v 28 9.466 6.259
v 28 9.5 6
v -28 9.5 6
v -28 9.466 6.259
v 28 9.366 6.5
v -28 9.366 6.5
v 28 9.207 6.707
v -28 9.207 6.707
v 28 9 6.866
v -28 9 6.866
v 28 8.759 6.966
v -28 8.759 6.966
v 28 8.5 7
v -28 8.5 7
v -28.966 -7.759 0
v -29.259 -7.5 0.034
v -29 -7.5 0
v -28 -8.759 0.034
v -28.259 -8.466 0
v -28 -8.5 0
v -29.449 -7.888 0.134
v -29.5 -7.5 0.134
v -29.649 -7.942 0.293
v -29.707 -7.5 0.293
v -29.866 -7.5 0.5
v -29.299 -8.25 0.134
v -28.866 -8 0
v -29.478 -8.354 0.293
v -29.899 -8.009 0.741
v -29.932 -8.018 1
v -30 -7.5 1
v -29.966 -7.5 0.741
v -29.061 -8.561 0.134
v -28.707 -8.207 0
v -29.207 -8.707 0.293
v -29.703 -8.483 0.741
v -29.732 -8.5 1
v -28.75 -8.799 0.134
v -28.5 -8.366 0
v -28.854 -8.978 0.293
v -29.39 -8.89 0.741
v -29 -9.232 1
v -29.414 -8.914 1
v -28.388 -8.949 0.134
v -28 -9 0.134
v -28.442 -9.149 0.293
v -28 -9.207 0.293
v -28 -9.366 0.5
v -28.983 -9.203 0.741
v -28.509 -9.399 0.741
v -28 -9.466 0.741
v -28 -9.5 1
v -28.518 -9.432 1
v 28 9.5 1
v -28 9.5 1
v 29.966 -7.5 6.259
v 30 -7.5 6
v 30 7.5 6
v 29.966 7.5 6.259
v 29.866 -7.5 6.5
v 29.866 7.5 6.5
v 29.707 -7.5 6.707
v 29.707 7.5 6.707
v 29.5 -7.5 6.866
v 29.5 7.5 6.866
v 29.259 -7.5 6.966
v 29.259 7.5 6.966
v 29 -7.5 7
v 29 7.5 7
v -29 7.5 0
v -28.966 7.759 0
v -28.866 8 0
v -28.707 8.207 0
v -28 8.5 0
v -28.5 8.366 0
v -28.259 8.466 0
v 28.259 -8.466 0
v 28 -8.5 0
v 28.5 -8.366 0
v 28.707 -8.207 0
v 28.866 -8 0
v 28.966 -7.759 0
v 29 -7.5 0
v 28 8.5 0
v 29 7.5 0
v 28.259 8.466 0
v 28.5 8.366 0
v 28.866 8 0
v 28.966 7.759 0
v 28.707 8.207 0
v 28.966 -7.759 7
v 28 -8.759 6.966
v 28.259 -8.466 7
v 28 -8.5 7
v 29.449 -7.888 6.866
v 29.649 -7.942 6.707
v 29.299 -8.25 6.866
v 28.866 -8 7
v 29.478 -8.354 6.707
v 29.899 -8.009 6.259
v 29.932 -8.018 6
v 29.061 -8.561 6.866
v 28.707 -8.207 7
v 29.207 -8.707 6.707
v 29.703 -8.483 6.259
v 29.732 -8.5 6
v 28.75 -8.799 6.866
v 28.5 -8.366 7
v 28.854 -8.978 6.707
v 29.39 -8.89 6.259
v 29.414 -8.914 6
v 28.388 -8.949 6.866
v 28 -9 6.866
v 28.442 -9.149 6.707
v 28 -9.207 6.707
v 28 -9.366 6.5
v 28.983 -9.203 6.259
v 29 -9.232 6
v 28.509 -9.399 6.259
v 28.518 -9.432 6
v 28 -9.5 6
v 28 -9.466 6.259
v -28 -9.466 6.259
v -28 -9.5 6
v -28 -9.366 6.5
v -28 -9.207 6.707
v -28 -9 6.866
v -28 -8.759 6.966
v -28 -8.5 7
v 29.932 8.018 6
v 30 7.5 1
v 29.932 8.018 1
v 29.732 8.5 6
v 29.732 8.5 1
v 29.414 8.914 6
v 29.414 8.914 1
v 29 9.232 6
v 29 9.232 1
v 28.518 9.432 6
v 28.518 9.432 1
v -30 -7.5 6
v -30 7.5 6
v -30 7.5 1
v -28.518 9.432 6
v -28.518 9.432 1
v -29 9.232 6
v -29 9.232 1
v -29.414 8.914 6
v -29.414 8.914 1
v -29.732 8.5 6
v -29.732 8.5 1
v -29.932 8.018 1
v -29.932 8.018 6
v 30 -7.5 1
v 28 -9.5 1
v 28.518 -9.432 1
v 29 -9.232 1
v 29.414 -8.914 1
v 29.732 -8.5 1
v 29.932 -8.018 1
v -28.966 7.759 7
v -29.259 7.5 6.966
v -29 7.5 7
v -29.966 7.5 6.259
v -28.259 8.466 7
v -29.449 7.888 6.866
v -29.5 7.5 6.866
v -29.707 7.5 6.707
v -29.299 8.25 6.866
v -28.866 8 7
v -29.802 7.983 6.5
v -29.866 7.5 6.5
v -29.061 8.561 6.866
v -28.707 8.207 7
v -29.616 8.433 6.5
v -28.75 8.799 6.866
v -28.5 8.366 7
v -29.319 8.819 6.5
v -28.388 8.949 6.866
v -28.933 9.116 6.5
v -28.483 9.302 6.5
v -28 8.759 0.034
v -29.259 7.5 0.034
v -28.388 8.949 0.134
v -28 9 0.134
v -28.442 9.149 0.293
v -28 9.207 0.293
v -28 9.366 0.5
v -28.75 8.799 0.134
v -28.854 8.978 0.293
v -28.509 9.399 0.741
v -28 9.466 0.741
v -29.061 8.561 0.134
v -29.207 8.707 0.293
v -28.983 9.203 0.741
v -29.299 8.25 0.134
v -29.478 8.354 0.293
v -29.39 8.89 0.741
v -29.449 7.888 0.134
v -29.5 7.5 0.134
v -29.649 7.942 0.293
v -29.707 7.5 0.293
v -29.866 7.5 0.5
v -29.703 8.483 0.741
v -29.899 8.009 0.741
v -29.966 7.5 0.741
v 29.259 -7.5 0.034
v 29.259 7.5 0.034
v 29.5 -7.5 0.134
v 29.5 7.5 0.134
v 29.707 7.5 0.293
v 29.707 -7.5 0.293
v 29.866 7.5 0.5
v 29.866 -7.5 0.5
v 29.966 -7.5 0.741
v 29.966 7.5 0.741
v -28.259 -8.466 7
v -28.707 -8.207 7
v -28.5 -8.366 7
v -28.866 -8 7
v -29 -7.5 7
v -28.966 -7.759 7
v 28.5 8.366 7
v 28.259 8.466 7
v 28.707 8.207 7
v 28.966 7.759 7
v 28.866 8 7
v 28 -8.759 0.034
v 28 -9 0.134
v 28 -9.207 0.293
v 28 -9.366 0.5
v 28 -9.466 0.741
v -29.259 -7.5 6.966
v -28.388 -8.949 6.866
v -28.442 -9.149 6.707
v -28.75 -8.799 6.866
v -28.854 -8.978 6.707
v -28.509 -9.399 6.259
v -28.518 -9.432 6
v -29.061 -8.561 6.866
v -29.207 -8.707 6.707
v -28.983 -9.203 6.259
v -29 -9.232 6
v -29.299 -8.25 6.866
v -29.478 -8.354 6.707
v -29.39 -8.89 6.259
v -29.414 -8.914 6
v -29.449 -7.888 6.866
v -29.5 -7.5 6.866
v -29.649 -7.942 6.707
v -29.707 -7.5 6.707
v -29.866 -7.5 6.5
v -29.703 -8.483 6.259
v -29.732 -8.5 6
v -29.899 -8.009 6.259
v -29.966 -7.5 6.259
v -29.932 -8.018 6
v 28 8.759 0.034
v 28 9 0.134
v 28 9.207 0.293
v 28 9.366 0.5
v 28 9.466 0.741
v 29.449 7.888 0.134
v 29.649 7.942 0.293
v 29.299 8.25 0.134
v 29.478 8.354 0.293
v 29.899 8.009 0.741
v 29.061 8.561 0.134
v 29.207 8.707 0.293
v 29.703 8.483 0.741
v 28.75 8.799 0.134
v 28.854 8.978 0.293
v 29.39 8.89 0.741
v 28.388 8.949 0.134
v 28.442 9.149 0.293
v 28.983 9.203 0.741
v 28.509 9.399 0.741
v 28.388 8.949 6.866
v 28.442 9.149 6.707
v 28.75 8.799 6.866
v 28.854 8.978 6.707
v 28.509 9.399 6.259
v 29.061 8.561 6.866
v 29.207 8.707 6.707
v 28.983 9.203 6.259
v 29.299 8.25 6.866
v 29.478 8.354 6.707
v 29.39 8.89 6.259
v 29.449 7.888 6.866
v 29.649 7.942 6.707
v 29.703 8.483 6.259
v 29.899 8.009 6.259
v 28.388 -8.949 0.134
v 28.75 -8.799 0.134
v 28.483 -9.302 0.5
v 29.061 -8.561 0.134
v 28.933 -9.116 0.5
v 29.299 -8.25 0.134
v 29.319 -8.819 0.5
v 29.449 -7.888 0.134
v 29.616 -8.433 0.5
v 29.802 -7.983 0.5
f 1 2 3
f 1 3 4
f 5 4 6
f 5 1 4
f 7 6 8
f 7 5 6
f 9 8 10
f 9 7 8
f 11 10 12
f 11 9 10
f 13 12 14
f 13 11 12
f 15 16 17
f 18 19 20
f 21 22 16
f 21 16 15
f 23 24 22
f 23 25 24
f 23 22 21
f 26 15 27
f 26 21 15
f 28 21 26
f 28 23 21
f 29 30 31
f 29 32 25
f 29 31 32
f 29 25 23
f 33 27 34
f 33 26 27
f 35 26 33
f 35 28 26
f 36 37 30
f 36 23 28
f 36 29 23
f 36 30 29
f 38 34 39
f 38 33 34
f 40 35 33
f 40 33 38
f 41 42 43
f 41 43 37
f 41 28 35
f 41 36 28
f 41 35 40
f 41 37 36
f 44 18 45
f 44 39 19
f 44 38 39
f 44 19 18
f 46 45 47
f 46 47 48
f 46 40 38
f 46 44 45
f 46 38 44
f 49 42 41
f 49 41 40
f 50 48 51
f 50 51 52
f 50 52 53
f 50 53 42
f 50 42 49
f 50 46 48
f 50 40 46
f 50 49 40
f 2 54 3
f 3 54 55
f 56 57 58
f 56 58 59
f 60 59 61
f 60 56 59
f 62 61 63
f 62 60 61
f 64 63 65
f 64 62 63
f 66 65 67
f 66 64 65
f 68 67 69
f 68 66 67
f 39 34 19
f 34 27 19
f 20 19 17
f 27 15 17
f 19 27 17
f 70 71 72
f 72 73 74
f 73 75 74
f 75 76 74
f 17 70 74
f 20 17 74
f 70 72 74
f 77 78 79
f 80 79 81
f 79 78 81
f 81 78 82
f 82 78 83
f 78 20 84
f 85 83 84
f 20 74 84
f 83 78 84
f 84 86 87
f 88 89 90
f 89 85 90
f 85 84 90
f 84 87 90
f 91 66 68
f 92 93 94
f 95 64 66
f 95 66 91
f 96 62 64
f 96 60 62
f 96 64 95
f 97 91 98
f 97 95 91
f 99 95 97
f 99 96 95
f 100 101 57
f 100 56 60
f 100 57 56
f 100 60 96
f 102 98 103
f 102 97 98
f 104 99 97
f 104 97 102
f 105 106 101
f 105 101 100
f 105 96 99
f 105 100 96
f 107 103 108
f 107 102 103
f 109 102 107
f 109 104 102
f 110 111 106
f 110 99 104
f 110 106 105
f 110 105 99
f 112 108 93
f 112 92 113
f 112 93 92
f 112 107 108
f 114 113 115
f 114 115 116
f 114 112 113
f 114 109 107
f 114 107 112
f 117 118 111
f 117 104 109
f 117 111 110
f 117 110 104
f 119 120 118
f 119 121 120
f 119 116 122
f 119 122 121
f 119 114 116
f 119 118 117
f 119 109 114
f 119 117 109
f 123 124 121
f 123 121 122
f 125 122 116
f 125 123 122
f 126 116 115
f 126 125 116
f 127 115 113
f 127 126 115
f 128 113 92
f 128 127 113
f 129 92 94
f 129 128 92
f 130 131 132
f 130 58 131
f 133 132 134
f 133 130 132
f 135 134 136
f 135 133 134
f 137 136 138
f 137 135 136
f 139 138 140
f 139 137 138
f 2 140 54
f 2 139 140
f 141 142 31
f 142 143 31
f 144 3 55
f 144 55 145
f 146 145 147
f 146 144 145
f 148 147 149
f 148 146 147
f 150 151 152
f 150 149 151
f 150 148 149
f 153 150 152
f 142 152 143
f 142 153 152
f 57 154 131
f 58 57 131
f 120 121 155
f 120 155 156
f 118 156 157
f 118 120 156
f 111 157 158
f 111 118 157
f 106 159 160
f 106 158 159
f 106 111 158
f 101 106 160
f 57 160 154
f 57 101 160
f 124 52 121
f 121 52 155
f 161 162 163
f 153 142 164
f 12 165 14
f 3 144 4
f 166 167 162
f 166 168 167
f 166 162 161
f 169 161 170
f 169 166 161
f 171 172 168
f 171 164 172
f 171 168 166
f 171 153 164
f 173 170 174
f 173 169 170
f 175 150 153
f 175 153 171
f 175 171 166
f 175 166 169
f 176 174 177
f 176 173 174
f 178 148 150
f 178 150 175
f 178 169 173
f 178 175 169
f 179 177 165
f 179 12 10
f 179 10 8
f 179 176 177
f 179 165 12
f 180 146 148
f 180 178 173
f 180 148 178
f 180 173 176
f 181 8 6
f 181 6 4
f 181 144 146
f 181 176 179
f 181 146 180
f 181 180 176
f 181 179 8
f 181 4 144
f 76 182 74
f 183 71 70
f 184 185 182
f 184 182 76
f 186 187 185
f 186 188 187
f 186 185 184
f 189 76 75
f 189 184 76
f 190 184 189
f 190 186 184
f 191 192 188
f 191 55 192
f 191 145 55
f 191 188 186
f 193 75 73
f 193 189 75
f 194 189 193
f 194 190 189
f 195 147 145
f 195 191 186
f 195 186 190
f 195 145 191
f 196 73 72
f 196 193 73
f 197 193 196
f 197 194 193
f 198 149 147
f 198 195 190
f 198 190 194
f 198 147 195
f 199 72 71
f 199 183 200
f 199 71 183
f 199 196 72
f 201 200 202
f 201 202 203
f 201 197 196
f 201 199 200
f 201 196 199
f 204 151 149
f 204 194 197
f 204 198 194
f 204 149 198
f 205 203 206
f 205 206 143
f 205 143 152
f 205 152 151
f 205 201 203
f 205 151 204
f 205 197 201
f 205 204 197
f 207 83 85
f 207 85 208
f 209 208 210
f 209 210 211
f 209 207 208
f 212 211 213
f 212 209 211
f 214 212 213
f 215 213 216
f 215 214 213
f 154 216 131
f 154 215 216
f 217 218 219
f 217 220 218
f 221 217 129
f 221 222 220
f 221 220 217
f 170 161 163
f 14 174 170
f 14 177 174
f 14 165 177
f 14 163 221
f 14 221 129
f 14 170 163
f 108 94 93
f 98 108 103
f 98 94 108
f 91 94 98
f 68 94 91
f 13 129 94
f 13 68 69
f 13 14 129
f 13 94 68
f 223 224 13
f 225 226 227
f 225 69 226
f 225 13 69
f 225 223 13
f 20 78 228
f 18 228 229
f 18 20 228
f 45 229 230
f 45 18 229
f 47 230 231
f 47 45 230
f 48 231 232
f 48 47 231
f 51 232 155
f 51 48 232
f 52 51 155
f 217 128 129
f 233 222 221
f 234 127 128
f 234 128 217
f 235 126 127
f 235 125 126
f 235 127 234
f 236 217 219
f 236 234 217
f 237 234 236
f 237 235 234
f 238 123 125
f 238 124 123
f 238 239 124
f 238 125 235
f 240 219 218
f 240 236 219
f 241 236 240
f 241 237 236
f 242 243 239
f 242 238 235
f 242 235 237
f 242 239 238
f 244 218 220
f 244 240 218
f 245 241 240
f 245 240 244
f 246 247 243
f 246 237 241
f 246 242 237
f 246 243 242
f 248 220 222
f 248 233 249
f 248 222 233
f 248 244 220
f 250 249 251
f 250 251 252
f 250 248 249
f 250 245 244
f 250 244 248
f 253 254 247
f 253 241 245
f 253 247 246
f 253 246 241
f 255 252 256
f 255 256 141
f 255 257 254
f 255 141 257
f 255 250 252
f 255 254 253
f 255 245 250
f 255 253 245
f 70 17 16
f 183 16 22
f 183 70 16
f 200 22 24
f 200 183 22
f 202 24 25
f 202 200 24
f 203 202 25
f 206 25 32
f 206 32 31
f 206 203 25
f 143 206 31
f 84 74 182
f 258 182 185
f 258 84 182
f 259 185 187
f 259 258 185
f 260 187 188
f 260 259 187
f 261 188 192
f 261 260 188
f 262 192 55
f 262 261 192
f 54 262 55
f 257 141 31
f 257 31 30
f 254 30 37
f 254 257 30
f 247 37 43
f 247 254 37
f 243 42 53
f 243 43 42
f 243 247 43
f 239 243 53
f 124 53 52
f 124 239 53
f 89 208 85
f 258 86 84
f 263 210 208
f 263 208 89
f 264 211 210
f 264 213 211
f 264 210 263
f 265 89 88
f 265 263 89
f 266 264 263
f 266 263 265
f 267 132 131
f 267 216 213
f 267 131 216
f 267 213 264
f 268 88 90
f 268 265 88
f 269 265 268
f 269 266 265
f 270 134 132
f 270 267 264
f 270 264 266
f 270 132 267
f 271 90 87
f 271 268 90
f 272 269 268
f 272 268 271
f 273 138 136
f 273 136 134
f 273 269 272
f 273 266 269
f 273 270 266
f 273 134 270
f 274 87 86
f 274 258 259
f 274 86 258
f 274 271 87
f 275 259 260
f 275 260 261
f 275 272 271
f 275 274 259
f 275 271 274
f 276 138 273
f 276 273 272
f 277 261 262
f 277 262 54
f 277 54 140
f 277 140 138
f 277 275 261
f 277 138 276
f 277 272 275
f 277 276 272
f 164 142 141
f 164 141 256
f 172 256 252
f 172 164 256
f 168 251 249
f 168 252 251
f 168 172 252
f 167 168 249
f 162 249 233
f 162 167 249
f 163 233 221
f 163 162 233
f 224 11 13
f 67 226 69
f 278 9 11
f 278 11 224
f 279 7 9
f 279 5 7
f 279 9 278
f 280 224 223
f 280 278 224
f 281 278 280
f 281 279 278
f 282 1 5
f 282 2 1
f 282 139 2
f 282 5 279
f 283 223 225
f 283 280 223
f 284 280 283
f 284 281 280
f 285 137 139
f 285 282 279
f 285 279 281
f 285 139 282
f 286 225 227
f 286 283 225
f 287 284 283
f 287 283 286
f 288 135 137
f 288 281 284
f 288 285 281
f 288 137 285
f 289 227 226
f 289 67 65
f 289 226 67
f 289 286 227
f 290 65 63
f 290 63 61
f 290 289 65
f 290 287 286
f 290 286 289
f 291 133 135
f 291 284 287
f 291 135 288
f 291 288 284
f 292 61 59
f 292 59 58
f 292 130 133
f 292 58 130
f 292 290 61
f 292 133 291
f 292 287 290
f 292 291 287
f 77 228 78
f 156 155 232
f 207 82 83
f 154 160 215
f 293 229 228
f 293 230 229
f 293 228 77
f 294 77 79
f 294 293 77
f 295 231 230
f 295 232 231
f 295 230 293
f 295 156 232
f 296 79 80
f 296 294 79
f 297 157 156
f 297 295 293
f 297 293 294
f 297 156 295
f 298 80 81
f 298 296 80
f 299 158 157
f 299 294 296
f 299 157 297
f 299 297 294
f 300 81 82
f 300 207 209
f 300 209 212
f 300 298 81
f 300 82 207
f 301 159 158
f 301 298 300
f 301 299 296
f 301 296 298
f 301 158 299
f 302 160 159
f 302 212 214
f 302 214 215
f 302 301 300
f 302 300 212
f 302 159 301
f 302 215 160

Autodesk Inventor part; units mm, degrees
ref_plane "YZ Plane" through (0, 0, 0) normal (1, 0, 0) x (0, 1, 0)
ref_plane "XZ Plane" through (0, 0, 0) normal (0, 1, 0) x (-1, 0, 0)
ref_plane "XY Plane" through (0, 0, 0) normal (0, 0, 1) x (1, 0, 0)
sketch "Skizze1" plane through (0, 0, 0) normal (0, 0, 1) x (1, 0, 0)
  line L0 (30, 9.5) -> (-30, 9.5)
  line L1 (-30, 9.5) -> (-30, -9.5)
  line L2 (-30, -9.5) -> (30, -9.5)
  line L3 (30, -9.5) -> (30, 9.5)
  line L4 (30, 9.5) -> (-30, -9.5) construction
  line L5 (-30, 9.5) -> (30, -9.5) construction
  point P0 (0, 0)
  dimension "d0" = 60
  dimension "d1" = 19
extrude "Extrusion1" add sketch "Skizze1" along normal blind 7
fillet "Rundung1" radius 2 4 edges at (-30, -9.5, 3.5) (30, -9.5, 3.5) (30, 9.5, 3.5) (-30, 9.5, 3.5)
fillet "Rundung2" radius 1 16 edges at (-29.4142, 8.9142, 7) (-30, 0, 7) (-29.4142, -8.9142, 7) (0, -9.5, 7) (29.4142, -8.9142, 7) (30, 0, 7) (29.4142, 8.9142, 7) (0, 9.5, 7) (29.4142, -8.9142, 0) (30, 0, 0) (29.4142, 8.9142, 0) (0, 9.5, 0) (-29.4142, 8.9142, 0) (-30, 0, 0) (-29.4142, -8.9142, 0) (0, -9.5, 0)
properties part number "P_Akku_1S"
